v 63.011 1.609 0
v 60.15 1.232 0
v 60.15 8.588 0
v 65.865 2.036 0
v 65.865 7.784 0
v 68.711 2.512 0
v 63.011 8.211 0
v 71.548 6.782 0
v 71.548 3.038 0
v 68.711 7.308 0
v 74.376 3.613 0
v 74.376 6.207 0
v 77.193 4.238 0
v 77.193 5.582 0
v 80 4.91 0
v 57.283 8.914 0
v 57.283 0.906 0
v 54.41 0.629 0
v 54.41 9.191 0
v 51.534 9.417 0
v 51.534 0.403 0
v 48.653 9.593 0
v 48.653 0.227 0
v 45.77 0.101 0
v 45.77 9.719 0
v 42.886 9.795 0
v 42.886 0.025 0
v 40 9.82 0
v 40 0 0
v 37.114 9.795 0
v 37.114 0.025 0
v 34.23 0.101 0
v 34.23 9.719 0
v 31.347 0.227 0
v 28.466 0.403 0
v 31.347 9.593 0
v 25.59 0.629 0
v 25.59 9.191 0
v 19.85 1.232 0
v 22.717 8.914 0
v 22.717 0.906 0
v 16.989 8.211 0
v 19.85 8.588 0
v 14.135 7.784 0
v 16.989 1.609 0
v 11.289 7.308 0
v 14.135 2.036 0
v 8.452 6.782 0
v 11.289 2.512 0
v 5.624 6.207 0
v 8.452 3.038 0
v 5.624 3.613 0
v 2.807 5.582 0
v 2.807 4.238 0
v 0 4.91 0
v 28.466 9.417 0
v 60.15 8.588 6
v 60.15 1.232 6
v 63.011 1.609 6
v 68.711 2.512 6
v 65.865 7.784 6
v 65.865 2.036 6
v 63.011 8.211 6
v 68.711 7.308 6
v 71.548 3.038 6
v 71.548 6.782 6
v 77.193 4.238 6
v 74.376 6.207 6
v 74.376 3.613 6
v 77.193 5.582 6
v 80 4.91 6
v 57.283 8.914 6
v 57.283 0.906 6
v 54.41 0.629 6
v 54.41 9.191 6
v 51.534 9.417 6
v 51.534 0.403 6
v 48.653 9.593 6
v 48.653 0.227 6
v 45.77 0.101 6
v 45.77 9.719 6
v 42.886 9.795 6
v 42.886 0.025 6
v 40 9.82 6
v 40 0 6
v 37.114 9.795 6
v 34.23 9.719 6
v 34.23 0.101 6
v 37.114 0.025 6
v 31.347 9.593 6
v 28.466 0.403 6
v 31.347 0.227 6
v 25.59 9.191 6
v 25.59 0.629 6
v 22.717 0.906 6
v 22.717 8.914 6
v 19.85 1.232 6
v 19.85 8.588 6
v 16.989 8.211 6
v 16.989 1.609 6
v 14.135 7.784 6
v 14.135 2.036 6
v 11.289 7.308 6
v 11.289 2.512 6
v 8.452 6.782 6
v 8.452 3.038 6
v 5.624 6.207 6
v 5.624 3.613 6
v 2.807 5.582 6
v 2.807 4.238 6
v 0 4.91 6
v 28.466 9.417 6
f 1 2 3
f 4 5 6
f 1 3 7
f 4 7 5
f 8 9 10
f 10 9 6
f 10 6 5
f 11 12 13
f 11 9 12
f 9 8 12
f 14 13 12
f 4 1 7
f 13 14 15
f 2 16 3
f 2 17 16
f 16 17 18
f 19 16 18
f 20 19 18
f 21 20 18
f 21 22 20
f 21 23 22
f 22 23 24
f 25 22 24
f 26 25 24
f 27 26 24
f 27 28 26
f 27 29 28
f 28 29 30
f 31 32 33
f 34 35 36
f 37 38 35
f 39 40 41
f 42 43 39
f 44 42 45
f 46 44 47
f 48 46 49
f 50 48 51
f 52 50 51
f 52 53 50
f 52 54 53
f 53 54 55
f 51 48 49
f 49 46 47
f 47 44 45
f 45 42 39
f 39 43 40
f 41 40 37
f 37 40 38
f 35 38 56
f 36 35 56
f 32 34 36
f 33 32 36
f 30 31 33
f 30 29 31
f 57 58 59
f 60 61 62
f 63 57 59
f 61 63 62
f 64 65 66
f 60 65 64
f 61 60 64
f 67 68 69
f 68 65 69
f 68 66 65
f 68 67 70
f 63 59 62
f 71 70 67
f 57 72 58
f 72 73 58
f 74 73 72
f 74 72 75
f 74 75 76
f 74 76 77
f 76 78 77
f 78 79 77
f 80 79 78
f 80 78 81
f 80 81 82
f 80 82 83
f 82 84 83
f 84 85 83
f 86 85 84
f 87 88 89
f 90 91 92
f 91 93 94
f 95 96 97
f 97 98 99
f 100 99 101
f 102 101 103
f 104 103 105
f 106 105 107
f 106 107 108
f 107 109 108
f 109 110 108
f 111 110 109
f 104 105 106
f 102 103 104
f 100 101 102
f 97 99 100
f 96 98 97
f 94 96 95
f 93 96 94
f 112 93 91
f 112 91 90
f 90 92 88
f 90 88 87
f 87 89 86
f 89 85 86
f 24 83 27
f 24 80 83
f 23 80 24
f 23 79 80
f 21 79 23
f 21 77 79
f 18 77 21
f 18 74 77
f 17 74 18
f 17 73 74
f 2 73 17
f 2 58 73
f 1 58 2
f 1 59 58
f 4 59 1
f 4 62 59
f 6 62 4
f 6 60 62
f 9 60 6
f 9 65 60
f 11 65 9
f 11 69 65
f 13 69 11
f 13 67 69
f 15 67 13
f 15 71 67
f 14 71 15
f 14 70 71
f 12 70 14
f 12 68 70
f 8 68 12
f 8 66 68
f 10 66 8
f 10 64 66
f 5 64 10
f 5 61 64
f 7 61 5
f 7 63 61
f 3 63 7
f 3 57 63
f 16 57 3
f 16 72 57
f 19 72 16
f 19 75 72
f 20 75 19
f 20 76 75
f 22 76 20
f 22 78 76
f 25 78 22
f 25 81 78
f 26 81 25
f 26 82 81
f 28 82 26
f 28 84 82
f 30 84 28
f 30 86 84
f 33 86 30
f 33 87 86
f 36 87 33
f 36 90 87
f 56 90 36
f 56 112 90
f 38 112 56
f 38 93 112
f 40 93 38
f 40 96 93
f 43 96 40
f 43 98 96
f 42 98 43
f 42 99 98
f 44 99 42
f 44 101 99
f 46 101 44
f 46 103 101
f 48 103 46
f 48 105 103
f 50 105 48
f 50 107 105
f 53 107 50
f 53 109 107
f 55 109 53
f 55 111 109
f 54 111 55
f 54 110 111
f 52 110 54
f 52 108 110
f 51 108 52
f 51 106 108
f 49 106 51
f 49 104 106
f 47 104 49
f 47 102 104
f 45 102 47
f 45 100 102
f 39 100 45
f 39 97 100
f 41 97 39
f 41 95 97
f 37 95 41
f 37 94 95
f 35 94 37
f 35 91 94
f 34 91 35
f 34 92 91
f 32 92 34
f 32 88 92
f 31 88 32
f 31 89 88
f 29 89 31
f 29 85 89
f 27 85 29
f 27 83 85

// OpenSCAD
$fn = 32;

// ----------------------------------------------------------------------
// Arc profile plate: lens, 56 points
// ----------------------------------------------------------------------

// --- parameters (mm) ---
lens_chord = 80;          // chord length of the lens, X
arc_r = 165.34;           // radius of both arcs
arc_angle = 28;           // angle of each arc, degrees
sagitta = 4.91;           // bulge of each arc (half the lens height)
arc_step = 1;             // sampling step of the arcs, degrees
plate_t = 6;              // plate thickness, Z

bbox_y = 2 * sagitta;  // full lens height

profile = [[80, 4.91], [77.193, 5.582], [74.376, 6.207], [71.548, 6.782], [68.711, 7.308], [65.865, 7.784], [63.011, 8.211], [60.15, 8.588], [57.283, 8.914], [54.41, 9.191], [51.534, 9.417], [48.653, 9.593], [45.77, 9.719], [42.886, 9.795], [40, 9.82], [37.114, 9.795], [34.23, 9.719], [31.347, 9.593], [28.466, 9.417], [25.59, 9.191], [22.717, 8.914], [19.85, 8.588], [16.989, 8.211], [14.135, 7.784], [11.289, 7.308], [8.452, 6.782], [5.624, 6.207], [2.807, 5.582], [0, 4.91], [2.807, 4.238], [5.624, 3.613], [8.452, 3.038], [11.289, 2.512], [14.135, 2.036], [16.989, 1.609], [19.85, 1.232], [22.717, 0.906], [25.59, 0.629], [28.466, 0.403], [31.347, 0.227], [34.23, 0.101], [37.114, 0.025], [40, 0], [42.886, 0.025], [45.77, 0.101], [48.653, 0.227], [51.534, 0.403], [54.41, 0.629], [57.283, 0.906], [60.15, 1.232], [63.011, 1.609], [65.865, 2.036], [68.711, 2.512], [71.548, 3.038], [74.376, 3.613], [77.193, 4.238]];  // primary outline, 56 points, counter clockwise

// --- the one profile operation ---
linear_extrude(height = plate_t) polygon(points = profile);
